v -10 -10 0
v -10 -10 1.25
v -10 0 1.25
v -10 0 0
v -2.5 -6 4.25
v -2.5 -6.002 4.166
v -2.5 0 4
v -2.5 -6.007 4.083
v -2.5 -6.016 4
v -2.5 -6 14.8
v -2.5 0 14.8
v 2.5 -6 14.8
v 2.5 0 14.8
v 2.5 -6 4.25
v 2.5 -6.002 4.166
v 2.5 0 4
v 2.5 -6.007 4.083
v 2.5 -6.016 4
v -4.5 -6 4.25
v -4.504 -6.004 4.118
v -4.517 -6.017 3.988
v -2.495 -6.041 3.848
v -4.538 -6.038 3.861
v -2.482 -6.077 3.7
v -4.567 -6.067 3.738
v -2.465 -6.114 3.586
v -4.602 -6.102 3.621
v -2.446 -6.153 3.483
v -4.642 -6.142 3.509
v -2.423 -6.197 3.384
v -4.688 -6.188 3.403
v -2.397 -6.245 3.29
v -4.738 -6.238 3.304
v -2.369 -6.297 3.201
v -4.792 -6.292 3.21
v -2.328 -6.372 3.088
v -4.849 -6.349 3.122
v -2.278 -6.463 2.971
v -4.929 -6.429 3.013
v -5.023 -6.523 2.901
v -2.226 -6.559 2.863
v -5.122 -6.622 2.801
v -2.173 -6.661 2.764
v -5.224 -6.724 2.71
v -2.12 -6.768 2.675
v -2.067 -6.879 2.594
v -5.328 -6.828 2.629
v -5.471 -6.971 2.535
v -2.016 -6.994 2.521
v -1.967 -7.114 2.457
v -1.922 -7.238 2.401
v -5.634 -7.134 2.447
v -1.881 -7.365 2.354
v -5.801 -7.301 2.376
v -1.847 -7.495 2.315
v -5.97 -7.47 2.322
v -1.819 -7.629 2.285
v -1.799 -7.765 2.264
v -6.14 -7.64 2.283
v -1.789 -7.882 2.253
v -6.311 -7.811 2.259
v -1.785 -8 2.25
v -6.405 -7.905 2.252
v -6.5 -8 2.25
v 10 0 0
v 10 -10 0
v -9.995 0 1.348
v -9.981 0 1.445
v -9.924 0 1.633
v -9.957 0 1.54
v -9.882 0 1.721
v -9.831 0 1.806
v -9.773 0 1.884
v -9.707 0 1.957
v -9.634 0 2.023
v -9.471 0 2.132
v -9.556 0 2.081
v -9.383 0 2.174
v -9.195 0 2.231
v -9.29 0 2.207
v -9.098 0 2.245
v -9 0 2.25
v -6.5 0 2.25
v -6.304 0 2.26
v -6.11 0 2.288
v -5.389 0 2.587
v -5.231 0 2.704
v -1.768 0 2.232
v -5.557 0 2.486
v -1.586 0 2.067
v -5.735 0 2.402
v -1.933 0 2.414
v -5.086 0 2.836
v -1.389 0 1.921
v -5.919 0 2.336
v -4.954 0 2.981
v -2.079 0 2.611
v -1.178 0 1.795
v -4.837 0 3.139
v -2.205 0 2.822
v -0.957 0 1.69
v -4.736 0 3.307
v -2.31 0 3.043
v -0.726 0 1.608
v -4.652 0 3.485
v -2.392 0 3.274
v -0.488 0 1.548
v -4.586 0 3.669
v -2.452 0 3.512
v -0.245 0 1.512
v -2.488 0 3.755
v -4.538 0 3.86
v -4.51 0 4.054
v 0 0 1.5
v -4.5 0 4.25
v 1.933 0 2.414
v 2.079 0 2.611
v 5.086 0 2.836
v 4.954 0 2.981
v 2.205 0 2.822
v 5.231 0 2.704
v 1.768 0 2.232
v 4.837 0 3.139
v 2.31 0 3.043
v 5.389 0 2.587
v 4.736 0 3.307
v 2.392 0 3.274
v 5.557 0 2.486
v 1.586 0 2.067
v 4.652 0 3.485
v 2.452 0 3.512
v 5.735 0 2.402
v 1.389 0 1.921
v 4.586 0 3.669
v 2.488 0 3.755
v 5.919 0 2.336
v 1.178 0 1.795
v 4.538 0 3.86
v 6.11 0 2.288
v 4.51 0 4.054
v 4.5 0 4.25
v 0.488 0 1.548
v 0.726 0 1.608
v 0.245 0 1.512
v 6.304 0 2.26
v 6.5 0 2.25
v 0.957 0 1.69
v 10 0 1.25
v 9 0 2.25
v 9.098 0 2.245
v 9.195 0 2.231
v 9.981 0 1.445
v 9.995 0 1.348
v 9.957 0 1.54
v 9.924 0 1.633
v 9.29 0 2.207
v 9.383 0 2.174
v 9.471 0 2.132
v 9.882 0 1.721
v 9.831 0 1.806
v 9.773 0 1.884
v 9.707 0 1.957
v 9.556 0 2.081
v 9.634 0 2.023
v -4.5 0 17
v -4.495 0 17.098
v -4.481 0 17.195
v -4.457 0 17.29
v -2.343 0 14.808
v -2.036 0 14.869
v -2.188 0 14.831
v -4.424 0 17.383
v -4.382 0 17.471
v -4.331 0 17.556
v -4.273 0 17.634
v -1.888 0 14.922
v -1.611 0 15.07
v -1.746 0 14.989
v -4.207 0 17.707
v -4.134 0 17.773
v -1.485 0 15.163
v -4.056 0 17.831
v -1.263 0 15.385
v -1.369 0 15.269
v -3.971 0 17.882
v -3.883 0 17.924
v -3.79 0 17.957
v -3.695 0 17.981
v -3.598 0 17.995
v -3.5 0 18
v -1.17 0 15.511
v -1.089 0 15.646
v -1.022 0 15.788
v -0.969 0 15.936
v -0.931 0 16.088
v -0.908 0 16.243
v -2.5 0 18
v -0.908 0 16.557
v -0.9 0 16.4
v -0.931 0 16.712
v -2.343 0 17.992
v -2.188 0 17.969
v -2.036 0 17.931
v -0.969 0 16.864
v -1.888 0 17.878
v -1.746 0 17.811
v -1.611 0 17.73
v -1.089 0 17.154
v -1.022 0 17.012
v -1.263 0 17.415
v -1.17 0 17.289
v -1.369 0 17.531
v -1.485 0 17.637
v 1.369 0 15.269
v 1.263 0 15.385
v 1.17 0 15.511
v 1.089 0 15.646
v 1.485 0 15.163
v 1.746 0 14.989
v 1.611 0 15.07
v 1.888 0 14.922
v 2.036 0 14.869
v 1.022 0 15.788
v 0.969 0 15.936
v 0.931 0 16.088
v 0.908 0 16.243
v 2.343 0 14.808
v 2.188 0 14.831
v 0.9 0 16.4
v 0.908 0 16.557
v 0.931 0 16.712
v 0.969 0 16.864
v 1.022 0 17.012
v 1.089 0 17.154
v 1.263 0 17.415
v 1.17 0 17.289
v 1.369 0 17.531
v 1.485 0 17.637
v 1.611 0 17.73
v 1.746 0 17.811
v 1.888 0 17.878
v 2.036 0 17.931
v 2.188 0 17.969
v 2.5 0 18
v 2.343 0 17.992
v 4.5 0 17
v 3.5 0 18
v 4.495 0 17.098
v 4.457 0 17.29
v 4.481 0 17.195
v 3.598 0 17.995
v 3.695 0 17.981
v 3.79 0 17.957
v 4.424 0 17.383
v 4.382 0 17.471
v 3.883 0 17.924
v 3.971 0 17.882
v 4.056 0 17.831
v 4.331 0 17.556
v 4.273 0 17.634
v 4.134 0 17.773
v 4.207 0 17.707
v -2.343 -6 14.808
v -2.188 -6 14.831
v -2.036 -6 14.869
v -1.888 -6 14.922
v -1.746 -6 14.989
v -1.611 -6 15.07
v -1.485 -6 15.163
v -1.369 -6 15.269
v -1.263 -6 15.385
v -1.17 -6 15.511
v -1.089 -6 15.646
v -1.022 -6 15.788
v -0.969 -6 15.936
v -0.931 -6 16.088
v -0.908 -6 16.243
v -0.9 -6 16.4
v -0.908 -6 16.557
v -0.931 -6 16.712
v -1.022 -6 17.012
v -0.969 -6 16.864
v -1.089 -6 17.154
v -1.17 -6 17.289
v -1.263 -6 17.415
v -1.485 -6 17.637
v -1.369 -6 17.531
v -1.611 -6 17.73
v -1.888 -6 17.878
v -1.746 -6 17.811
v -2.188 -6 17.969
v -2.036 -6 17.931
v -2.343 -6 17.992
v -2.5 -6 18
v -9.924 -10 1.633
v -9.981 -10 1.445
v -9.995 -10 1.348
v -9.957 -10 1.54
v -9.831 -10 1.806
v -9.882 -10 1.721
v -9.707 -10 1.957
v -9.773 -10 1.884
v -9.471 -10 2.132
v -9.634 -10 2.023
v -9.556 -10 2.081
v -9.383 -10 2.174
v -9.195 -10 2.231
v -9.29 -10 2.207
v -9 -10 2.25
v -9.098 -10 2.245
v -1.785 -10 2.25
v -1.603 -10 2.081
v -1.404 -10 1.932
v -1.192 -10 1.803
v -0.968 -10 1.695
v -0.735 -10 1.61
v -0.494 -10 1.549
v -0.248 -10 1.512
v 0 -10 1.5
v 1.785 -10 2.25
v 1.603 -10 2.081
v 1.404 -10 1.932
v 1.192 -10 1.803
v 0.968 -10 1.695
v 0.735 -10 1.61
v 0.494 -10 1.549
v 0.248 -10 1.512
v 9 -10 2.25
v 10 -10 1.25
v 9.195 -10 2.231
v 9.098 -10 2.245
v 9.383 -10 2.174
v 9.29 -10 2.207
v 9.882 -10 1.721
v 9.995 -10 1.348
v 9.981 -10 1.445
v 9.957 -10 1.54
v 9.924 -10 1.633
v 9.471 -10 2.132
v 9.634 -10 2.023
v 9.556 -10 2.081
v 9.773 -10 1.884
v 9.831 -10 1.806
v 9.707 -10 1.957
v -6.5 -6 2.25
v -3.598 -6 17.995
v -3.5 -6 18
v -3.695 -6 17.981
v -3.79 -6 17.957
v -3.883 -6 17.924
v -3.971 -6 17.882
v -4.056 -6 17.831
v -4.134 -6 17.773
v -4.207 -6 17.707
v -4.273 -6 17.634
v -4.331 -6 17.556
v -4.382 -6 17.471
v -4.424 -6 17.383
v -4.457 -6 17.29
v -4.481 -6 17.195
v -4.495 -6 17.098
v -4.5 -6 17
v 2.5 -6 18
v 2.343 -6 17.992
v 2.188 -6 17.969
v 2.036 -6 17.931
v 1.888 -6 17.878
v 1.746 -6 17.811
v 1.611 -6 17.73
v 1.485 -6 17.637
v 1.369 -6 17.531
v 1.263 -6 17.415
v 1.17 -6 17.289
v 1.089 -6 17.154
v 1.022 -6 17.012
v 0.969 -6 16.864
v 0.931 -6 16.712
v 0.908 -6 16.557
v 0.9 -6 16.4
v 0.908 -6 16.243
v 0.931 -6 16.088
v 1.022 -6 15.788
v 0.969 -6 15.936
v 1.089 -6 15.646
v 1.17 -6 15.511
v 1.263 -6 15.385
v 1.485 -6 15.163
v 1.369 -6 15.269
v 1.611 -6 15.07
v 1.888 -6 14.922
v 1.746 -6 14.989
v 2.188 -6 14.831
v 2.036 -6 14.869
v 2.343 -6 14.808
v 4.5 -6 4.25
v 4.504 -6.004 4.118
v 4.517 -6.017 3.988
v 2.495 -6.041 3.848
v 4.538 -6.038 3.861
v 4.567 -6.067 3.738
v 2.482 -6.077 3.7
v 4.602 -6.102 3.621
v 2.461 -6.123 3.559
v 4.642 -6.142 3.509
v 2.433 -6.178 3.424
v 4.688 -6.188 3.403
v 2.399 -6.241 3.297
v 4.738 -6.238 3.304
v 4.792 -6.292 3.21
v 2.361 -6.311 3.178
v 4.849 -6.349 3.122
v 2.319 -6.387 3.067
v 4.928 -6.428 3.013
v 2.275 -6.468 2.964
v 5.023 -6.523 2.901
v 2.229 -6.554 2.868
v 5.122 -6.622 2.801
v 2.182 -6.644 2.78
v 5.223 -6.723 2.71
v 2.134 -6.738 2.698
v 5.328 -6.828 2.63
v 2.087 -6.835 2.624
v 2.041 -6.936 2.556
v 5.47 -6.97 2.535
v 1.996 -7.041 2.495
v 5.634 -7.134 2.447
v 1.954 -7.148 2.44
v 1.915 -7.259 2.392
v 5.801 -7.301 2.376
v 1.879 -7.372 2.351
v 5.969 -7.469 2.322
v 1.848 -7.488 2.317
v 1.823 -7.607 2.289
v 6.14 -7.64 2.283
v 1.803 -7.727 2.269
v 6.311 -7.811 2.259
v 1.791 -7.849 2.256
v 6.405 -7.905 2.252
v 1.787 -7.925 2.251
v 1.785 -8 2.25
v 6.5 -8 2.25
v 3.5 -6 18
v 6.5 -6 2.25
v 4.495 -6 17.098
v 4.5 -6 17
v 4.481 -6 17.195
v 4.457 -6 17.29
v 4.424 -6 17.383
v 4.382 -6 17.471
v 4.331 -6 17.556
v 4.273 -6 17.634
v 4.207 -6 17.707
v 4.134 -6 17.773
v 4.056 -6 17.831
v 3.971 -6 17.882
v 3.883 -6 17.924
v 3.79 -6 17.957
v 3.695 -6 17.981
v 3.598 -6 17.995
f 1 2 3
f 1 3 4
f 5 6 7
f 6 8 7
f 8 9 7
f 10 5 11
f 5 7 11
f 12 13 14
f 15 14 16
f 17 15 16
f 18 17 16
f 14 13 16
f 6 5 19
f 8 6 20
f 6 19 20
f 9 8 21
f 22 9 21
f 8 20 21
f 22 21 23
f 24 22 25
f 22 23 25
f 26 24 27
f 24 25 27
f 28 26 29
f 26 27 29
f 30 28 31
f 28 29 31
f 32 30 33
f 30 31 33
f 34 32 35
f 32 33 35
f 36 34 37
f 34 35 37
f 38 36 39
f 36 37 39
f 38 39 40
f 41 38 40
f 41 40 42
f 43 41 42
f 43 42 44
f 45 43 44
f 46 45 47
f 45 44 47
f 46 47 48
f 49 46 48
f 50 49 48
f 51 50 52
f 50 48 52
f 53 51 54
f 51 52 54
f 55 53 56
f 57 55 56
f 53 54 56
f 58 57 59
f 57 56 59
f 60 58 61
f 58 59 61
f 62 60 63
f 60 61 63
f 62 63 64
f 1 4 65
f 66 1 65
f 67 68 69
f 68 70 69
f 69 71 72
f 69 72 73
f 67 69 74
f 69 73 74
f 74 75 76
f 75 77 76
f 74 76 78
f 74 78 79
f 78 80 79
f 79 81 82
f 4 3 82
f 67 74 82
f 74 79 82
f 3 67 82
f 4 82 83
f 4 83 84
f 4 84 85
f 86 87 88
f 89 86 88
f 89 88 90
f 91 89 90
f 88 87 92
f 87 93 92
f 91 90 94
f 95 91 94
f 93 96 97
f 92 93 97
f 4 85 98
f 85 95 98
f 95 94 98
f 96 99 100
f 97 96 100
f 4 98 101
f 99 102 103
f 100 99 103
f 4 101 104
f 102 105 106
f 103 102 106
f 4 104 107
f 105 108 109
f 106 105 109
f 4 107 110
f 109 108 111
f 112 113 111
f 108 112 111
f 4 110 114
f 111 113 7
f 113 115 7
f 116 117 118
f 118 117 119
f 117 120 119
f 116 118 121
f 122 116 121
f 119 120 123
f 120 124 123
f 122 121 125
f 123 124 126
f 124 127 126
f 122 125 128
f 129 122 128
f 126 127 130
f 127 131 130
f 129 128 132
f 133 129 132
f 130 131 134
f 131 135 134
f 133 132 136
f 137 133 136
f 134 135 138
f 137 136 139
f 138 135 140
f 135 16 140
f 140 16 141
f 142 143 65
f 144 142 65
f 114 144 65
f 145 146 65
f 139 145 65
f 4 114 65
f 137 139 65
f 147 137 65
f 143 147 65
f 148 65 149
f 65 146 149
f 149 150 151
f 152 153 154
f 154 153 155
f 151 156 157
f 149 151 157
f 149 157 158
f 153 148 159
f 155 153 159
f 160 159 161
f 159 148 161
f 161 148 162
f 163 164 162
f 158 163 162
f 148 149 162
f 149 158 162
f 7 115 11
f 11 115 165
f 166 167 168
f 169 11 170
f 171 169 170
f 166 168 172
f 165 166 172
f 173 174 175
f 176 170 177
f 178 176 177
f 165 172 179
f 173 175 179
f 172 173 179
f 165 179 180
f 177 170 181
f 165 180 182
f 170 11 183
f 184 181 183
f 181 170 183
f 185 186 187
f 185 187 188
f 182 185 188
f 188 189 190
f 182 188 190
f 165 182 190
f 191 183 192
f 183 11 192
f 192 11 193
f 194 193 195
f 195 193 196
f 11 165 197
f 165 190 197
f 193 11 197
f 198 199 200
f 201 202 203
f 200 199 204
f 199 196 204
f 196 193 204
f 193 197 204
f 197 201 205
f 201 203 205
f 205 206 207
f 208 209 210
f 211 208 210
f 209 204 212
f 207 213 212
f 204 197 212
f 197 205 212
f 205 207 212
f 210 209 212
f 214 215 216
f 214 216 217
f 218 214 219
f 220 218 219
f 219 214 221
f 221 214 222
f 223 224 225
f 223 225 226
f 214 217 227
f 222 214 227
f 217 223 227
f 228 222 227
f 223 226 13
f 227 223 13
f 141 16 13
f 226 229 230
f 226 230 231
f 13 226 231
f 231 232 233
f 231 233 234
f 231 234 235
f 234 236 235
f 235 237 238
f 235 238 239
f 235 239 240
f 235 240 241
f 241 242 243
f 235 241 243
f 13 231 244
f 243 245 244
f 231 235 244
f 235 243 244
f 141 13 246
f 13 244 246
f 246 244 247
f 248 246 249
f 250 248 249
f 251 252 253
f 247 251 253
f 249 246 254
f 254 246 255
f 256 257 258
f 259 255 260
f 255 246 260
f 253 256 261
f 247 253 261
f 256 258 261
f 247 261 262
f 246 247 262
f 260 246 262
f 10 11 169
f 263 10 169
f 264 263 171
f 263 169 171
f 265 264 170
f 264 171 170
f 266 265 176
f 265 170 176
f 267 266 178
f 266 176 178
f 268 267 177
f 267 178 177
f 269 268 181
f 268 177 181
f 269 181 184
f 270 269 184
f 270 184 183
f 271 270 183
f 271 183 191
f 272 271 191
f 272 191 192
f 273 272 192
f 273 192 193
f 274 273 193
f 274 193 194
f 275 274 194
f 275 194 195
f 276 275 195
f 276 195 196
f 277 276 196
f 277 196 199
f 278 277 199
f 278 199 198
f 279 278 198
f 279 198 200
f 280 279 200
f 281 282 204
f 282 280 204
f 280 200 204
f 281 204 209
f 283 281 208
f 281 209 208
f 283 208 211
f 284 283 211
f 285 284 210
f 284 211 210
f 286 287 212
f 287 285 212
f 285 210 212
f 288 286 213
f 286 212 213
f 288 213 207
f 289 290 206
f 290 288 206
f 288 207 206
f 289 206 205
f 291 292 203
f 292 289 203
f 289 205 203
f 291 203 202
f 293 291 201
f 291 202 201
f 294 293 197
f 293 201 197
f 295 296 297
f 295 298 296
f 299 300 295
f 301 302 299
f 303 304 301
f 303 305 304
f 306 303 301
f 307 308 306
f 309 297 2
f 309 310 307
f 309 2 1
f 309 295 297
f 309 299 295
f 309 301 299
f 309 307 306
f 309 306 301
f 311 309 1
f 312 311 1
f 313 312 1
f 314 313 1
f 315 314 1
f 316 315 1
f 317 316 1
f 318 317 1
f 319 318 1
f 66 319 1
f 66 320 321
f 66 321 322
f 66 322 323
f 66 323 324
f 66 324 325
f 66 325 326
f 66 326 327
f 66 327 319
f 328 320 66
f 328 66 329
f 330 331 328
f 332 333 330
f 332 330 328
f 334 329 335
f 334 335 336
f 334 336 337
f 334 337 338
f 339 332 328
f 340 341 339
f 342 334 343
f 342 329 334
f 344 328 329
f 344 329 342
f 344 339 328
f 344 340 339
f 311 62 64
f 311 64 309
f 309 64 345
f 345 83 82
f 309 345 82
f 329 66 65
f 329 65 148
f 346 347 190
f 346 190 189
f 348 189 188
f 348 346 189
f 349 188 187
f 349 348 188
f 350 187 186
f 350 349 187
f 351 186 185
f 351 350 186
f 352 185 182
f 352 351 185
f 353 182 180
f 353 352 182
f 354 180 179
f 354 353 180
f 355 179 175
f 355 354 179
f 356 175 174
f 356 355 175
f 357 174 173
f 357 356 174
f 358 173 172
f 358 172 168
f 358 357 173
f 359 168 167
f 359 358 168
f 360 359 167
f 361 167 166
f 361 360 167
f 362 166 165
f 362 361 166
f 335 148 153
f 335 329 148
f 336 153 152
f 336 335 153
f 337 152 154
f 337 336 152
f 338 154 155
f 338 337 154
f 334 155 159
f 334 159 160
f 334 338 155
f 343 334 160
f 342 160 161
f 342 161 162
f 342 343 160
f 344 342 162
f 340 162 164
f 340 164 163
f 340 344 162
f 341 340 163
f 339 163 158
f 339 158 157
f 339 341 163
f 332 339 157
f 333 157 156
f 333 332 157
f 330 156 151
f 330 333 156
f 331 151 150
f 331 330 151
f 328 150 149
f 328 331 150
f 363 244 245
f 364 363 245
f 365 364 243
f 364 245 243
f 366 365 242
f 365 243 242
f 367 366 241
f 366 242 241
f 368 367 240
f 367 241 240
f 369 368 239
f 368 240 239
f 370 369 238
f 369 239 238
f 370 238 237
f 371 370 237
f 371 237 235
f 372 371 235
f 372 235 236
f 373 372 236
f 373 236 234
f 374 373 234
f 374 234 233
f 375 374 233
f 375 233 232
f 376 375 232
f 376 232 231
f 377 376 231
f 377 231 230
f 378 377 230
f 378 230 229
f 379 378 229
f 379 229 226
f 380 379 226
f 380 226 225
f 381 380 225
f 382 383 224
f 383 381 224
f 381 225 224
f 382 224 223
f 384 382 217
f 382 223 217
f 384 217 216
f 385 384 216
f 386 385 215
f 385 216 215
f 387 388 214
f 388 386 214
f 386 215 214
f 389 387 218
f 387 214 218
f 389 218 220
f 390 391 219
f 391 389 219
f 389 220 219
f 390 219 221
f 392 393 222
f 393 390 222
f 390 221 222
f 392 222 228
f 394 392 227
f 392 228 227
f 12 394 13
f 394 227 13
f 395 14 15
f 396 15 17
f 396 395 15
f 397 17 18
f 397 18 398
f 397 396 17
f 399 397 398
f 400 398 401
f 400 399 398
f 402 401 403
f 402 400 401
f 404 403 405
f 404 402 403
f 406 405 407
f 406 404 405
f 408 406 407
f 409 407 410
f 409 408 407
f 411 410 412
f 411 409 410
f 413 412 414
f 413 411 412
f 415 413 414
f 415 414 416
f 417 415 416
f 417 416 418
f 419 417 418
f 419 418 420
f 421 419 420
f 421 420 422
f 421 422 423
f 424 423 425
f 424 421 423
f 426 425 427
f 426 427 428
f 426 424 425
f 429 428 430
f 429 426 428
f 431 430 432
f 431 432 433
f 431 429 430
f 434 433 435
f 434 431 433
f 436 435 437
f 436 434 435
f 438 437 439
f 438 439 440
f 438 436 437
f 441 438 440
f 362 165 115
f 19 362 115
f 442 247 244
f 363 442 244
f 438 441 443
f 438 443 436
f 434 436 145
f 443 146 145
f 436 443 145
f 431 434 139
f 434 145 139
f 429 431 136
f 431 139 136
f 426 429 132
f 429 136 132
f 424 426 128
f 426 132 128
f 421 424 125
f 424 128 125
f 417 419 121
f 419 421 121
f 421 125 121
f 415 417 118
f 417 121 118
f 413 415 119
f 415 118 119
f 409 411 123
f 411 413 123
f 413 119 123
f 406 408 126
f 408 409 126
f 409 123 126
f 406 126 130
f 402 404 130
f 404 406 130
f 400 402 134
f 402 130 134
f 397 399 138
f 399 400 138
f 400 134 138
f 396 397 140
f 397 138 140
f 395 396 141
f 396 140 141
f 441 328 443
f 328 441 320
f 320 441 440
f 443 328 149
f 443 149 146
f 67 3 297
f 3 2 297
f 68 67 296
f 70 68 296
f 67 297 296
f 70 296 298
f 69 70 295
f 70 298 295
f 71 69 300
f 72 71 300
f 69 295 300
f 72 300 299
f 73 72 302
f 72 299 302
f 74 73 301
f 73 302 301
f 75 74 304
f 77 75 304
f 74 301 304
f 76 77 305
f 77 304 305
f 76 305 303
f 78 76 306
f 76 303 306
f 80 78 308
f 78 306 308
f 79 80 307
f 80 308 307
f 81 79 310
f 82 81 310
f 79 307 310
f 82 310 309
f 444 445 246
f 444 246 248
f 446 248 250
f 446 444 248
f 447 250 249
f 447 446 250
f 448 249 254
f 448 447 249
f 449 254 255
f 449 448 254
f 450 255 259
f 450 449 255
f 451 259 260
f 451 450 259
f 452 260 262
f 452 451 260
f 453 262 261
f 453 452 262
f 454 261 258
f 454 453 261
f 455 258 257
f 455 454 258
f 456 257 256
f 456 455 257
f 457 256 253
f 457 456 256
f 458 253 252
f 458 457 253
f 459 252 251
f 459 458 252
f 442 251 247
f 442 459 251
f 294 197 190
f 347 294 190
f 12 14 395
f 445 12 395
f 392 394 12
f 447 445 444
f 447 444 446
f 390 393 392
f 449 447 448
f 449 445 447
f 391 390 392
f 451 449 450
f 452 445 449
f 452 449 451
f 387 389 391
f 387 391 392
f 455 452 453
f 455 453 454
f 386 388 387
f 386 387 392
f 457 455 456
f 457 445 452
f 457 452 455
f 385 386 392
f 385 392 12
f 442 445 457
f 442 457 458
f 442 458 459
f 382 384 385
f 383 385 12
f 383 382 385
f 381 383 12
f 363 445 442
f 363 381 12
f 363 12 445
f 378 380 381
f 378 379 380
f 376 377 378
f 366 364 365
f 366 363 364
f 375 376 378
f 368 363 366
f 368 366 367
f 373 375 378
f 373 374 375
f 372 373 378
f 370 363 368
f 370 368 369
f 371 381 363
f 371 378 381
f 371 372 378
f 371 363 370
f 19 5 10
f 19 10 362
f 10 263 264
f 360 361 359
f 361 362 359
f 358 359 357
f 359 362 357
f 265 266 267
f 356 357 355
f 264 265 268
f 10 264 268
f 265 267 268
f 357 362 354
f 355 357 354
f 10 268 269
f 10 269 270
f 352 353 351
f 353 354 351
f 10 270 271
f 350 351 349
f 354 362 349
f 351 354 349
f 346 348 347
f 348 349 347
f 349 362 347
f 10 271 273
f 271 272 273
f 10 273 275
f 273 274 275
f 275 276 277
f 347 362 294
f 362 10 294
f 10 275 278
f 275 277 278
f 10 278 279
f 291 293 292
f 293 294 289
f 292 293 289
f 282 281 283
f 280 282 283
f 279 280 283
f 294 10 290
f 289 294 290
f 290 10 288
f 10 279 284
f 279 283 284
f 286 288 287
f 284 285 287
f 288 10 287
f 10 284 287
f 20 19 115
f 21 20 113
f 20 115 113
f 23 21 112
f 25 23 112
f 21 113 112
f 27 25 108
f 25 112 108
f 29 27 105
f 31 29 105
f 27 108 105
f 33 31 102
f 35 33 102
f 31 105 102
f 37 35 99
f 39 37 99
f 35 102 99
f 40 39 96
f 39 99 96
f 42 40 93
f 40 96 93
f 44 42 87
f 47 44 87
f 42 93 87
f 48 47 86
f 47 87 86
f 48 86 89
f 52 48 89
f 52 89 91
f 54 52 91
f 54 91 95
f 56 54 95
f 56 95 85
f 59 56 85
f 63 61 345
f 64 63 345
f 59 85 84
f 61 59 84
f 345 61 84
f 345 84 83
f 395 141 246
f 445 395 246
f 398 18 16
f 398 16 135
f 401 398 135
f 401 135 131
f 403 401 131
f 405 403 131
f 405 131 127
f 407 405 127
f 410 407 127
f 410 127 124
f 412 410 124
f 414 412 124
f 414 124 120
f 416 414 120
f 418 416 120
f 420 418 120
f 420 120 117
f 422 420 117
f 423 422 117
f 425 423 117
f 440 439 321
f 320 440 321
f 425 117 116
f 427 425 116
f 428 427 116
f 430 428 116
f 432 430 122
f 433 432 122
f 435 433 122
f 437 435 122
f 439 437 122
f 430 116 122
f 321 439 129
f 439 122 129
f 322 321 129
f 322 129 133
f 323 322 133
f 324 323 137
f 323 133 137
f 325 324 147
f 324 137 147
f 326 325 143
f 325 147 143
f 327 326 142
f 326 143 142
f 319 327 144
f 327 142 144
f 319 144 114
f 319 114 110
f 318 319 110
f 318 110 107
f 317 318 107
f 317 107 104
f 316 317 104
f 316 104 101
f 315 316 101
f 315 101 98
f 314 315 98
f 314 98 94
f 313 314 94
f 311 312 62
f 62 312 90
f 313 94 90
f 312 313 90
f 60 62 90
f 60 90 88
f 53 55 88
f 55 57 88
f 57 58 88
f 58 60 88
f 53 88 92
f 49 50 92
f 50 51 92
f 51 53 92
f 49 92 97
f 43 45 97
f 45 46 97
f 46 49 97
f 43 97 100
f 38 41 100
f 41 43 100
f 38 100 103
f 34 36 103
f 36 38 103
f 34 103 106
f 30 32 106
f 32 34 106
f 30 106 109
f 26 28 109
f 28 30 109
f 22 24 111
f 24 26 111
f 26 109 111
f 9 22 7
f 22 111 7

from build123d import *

# Parameters (mm, degrees)
F1_DEPTH      = 10
F2_R          = 1
F3_R          = 1
F4_R          = 1
F5_R          = 1
F6_W          = 4
F6_H          = 15.75
F7_DEPTH      = 10.001
F7_DEPTH_BACK = 10.001
F8_R          = 2


with BuildPart() as f1:
    # F0 (on Front) → F1 (new body)
    with BuildSketch(Plane.XZ):
        with BuildLine():
            Line((-10, 0), (0, 0))
            Line((0, 0), (10, 0))
            Line((10, 0), (10, 2.25))
            Line((10, 2.25), (6.5, 2.25))
            ThreePointArc((6.5, 2.25), (5.0857864376, 2.8357864376), (4.5, 4.25))
            Line((4.5, 4.25), (4.5, 18))
            Line((4.5, 18), (2.5, 18))
            ThreePointArc((2.5, 18), (0.9, 16.4), (2.5, 14.8))
            Line((2.5, 14.8), (2.5, 4))
            ThreePointArc((2.5, 4), (0, 1.5), (-2.5, 4))
            Line((-2.5, 4), (-2.5, 14.8))
            ThreePointArc((-2.5, 14.8), (-0.9, 16.4), (-2.5, 18))
            Line((-2.5, 18), (-4.5, 18))
            Line((-4.5, 18), (-4.5, 4.25))
            ThreePointArc((-4.5, 4.25), (-5.0857864376, 2.8357864376), (-6.5, 2.25))
            Line((-6.5, 2.25), (-10, 2.25))
            Line((-10, 2.25), (-10, 0))
        make_face()
    extrude(amount=F1_DEPTH)

    # F2
    f2_edges = [f1.edges().sort_by_distance(p)[0] for p in [
        (4.5, -5, 18),
    ]]
    fillet(f2_edges, radius=F2_R)

    # F3
    f3_edges = [f1.edges().sort_by_distance(p)[0] for p in [
        (-4.5, -5, 18),
    ]]
    fillet(f3_edges, radius=F3_R)

    # F4
    f4_edges = [f1.edges().sort_by_distance(p)[0] for p in [
        (10, -5, 2.25),
    ]]
    fillet(f4_edges, radius=F4_R)

    # F5
    f5_edges = [f1.edges().sort_by_distance(p)[0] for p in [
        (-10, -5, 2.25),
    ]]
    fillet(f5_edges, radius=F5_R)

    # F6 (on Right) → F7 (cut, two sides)
    with BuildSketch(Plane.YZ) as f7_sk:
        with Locations((-8, 10.125)):
            Rectangle(F6_W, F6_H)
    extrude(amount=-F7_DEPTH, mode=Mode.SUBTRACT)
    extrude(f7_sk.sketch, amount=F7_DEPTH_BACK, mode=Mode.SUBTRACT)

    # F8
    f8_edges = [f1.edges().sort_by_distance(p)[0] for p in [
        (-4.142679, -6, 2.25),
        (4.142679, -6, 2.25),
    ]]
    fillet(f8_edges, radius=F8_R)


solid = f1.part
